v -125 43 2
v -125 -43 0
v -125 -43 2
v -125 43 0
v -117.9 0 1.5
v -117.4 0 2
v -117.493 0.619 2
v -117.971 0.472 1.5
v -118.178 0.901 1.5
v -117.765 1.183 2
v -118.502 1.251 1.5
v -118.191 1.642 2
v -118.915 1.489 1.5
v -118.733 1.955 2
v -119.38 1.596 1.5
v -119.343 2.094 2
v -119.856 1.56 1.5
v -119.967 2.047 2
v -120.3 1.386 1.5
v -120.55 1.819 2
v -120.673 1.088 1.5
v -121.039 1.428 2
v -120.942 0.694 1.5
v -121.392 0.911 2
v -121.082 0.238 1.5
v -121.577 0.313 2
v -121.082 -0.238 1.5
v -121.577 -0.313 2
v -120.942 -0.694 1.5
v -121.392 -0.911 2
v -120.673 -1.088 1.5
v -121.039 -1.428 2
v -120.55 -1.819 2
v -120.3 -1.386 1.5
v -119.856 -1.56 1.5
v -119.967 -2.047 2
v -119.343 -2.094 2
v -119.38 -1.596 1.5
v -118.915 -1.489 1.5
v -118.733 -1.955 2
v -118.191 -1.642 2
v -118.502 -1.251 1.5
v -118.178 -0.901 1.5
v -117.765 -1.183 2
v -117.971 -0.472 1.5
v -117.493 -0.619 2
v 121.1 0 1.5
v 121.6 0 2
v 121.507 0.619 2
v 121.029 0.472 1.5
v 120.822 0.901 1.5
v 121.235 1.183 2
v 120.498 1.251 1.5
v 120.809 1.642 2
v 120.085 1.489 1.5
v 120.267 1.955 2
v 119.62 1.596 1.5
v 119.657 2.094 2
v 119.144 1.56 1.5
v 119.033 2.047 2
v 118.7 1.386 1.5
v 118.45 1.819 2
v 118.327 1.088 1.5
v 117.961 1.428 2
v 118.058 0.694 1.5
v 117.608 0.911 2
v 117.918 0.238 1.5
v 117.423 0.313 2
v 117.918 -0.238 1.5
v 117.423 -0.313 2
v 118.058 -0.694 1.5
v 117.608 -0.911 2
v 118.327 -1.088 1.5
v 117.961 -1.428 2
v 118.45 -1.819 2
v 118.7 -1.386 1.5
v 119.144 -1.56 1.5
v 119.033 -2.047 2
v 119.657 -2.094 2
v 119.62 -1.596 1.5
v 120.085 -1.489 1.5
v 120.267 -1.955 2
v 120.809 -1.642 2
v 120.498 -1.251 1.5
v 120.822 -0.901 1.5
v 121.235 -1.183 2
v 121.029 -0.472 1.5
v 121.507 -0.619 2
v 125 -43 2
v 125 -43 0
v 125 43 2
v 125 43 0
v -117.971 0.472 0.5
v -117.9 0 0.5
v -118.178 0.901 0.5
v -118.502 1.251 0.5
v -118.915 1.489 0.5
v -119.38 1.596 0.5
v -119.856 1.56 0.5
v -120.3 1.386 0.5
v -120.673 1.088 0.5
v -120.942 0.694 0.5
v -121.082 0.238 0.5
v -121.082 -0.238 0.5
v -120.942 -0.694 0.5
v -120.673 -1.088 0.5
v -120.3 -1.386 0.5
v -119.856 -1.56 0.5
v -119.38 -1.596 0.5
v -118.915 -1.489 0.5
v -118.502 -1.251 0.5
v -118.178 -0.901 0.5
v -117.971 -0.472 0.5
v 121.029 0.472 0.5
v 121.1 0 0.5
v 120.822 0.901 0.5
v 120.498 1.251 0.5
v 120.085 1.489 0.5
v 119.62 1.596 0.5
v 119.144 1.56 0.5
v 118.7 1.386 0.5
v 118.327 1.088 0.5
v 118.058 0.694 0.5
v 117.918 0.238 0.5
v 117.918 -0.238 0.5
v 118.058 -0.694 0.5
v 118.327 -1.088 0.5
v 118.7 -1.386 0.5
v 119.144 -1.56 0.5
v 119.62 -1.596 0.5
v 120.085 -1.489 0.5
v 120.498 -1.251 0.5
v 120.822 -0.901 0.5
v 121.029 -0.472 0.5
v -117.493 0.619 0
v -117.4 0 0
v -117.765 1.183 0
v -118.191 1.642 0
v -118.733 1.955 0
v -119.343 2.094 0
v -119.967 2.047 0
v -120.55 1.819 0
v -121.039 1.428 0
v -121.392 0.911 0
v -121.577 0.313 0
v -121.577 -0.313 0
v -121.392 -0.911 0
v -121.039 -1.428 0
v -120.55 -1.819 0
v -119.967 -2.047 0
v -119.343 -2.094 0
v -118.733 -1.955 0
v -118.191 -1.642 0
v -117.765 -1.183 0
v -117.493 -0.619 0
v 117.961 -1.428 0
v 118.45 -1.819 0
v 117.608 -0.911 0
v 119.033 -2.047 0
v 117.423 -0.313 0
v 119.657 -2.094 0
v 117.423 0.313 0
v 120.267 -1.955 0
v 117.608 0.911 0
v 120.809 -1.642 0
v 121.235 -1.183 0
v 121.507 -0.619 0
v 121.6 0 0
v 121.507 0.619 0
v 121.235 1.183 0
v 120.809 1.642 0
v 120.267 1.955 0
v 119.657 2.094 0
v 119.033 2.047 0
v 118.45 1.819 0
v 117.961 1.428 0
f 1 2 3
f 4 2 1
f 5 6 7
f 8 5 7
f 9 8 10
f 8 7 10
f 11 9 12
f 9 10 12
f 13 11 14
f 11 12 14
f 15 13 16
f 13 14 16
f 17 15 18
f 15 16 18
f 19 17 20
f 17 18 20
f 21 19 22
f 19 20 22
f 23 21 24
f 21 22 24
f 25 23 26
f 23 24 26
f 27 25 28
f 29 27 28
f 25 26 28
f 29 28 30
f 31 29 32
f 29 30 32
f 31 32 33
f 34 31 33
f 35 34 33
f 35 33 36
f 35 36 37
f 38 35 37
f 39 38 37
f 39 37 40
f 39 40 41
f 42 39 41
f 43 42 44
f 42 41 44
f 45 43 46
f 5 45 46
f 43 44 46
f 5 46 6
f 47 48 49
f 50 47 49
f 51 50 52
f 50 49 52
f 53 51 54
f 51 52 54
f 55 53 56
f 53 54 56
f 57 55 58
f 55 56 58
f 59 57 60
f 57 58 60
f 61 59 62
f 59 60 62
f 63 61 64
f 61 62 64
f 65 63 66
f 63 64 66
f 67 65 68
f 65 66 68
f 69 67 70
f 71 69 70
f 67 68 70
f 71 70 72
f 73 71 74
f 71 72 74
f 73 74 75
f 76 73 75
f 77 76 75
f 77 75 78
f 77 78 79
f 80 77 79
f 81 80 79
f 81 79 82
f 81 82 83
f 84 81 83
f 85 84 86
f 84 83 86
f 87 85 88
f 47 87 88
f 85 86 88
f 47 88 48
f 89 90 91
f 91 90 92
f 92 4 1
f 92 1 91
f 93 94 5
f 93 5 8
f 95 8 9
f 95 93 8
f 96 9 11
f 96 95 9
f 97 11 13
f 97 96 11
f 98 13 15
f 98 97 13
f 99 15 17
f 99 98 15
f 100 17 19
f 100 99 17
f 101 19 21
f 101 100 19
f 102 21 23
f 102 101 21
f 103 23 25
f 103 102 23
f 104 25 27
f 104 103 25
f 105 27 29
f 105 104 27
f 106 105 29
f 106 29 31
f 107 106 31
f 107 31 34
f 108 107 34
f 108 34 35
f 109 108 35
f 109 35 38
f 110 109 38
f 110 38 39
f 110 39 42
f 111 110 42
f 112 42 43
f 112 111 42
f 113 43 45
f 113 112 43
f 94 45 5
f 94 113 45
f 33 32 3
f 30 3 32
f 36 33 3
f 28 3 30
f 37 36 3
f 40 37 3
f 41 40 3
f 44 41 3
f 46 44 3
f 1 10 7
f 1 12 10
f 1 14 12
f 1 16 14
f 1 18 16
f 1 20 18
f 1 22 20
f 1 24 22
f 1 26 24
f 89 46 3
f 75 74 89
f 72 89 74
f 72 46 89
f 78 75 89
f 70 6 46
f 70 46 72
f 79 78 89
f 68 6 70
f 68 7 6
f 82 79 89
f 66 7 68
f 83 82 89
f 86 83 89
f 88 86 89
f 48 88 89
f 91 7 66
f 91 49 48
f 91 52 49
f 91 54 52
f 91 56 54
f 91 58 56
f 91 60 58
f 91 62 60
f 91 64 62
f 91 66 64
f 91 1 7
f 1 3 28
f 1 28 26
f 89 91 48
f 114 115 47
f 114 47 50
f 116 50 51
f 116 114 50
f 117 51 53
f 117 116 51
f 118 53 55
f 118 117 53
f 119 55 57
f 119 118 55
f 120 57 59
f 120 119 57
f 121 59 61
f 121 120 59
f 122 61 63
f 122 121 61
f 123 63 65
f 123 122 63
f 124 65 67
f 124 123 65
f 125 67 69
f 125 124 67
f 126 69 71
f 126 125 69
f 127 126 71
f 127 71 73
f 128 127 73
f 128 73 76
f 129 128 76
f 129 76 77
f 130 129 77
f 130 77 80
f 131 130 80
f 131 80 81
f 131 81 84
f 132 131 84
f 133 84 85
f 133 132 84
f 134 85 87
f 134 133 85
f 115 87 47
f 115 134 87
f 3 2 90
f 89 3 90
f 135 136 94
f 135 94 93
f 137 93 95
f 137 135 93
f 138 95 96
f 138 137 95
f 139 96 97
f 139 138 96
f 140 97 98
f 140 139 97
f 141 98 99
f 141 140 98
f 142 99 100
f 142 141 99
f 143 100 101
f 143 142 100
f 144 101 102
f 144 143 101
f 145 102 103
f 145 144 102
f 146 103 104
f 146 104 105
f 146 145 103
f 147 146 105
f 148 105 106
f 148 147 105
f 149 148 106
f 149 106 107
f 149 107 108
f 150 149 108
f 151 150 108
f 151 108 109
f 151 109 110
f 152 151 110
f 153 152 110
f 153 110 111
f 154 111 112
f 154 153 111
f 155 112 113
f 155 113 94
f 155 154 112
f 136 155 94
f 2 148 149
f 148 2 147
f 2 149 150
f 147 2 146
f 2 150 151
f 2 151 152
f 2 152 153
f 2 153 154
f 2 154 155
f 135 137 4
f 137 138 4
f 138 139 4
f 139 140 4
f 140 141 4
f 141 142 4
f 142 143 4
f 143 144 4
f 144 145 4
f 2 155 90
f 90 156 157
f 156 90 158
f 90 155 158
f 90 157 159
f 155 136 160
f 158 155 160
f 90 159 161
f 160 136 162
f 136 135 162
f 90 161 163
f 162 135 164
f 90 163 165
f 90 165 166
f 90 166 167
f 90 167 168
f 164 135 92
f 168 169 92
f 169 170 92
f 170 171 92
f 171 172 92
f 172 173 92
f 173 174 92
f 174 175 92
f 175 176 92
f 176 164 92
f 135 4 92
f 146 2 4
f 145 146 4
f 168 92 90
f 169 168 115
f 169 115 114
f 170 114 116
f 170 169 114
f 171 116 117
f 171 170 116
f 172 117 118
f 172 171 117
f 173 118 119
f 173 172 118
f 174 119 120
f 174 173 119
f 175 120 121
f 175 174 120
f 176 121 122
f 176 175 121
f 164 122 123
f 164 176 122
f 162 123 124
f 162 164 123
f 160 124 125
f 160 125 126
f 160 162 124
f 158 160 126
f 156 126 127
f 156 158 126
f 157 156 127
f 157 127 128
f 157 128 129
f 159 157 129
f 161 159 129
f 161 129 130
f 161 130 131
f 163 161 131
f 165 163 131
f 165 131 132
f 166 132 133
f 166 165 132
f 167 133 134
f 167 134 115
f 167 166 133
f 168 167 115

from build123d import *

# Parameters (mm, degrees)
F0_W     = 250
F0_H     = 86
F0_R     = 1.6
F1_DEPTH = 2
F2_SIZE  = 0.5


with BuildPart() as f1:
    # F0 (on Top) → F1 (new body)
    with BuildSketch(Plane.XY):
        Rectangle(F0_W, F0_H)
        with Locations((-119.5, 0)):
            Circle(F0_R, mode=Mode.SUBTRACT)
        with Locations((119.5, 0)):
            Circle(F0_R, mode=Mode.SUBTRACT)
    extrude(amount=F1_DEPTH)

    # F2
    f2_edges = [f1.edges().sort_by_distance(p)[0] for p in [
        (-117.9, 0, 1),
        (-121.1, 0, 0),
        (-121.1, 0, 2),
        (121.1, 0, 1),
        (117.9, 0, 0),
        (117.9, 0, 2),
    ]]
    chamfer(f2_edges, length=F2_SIZE)


solid = f1.part
